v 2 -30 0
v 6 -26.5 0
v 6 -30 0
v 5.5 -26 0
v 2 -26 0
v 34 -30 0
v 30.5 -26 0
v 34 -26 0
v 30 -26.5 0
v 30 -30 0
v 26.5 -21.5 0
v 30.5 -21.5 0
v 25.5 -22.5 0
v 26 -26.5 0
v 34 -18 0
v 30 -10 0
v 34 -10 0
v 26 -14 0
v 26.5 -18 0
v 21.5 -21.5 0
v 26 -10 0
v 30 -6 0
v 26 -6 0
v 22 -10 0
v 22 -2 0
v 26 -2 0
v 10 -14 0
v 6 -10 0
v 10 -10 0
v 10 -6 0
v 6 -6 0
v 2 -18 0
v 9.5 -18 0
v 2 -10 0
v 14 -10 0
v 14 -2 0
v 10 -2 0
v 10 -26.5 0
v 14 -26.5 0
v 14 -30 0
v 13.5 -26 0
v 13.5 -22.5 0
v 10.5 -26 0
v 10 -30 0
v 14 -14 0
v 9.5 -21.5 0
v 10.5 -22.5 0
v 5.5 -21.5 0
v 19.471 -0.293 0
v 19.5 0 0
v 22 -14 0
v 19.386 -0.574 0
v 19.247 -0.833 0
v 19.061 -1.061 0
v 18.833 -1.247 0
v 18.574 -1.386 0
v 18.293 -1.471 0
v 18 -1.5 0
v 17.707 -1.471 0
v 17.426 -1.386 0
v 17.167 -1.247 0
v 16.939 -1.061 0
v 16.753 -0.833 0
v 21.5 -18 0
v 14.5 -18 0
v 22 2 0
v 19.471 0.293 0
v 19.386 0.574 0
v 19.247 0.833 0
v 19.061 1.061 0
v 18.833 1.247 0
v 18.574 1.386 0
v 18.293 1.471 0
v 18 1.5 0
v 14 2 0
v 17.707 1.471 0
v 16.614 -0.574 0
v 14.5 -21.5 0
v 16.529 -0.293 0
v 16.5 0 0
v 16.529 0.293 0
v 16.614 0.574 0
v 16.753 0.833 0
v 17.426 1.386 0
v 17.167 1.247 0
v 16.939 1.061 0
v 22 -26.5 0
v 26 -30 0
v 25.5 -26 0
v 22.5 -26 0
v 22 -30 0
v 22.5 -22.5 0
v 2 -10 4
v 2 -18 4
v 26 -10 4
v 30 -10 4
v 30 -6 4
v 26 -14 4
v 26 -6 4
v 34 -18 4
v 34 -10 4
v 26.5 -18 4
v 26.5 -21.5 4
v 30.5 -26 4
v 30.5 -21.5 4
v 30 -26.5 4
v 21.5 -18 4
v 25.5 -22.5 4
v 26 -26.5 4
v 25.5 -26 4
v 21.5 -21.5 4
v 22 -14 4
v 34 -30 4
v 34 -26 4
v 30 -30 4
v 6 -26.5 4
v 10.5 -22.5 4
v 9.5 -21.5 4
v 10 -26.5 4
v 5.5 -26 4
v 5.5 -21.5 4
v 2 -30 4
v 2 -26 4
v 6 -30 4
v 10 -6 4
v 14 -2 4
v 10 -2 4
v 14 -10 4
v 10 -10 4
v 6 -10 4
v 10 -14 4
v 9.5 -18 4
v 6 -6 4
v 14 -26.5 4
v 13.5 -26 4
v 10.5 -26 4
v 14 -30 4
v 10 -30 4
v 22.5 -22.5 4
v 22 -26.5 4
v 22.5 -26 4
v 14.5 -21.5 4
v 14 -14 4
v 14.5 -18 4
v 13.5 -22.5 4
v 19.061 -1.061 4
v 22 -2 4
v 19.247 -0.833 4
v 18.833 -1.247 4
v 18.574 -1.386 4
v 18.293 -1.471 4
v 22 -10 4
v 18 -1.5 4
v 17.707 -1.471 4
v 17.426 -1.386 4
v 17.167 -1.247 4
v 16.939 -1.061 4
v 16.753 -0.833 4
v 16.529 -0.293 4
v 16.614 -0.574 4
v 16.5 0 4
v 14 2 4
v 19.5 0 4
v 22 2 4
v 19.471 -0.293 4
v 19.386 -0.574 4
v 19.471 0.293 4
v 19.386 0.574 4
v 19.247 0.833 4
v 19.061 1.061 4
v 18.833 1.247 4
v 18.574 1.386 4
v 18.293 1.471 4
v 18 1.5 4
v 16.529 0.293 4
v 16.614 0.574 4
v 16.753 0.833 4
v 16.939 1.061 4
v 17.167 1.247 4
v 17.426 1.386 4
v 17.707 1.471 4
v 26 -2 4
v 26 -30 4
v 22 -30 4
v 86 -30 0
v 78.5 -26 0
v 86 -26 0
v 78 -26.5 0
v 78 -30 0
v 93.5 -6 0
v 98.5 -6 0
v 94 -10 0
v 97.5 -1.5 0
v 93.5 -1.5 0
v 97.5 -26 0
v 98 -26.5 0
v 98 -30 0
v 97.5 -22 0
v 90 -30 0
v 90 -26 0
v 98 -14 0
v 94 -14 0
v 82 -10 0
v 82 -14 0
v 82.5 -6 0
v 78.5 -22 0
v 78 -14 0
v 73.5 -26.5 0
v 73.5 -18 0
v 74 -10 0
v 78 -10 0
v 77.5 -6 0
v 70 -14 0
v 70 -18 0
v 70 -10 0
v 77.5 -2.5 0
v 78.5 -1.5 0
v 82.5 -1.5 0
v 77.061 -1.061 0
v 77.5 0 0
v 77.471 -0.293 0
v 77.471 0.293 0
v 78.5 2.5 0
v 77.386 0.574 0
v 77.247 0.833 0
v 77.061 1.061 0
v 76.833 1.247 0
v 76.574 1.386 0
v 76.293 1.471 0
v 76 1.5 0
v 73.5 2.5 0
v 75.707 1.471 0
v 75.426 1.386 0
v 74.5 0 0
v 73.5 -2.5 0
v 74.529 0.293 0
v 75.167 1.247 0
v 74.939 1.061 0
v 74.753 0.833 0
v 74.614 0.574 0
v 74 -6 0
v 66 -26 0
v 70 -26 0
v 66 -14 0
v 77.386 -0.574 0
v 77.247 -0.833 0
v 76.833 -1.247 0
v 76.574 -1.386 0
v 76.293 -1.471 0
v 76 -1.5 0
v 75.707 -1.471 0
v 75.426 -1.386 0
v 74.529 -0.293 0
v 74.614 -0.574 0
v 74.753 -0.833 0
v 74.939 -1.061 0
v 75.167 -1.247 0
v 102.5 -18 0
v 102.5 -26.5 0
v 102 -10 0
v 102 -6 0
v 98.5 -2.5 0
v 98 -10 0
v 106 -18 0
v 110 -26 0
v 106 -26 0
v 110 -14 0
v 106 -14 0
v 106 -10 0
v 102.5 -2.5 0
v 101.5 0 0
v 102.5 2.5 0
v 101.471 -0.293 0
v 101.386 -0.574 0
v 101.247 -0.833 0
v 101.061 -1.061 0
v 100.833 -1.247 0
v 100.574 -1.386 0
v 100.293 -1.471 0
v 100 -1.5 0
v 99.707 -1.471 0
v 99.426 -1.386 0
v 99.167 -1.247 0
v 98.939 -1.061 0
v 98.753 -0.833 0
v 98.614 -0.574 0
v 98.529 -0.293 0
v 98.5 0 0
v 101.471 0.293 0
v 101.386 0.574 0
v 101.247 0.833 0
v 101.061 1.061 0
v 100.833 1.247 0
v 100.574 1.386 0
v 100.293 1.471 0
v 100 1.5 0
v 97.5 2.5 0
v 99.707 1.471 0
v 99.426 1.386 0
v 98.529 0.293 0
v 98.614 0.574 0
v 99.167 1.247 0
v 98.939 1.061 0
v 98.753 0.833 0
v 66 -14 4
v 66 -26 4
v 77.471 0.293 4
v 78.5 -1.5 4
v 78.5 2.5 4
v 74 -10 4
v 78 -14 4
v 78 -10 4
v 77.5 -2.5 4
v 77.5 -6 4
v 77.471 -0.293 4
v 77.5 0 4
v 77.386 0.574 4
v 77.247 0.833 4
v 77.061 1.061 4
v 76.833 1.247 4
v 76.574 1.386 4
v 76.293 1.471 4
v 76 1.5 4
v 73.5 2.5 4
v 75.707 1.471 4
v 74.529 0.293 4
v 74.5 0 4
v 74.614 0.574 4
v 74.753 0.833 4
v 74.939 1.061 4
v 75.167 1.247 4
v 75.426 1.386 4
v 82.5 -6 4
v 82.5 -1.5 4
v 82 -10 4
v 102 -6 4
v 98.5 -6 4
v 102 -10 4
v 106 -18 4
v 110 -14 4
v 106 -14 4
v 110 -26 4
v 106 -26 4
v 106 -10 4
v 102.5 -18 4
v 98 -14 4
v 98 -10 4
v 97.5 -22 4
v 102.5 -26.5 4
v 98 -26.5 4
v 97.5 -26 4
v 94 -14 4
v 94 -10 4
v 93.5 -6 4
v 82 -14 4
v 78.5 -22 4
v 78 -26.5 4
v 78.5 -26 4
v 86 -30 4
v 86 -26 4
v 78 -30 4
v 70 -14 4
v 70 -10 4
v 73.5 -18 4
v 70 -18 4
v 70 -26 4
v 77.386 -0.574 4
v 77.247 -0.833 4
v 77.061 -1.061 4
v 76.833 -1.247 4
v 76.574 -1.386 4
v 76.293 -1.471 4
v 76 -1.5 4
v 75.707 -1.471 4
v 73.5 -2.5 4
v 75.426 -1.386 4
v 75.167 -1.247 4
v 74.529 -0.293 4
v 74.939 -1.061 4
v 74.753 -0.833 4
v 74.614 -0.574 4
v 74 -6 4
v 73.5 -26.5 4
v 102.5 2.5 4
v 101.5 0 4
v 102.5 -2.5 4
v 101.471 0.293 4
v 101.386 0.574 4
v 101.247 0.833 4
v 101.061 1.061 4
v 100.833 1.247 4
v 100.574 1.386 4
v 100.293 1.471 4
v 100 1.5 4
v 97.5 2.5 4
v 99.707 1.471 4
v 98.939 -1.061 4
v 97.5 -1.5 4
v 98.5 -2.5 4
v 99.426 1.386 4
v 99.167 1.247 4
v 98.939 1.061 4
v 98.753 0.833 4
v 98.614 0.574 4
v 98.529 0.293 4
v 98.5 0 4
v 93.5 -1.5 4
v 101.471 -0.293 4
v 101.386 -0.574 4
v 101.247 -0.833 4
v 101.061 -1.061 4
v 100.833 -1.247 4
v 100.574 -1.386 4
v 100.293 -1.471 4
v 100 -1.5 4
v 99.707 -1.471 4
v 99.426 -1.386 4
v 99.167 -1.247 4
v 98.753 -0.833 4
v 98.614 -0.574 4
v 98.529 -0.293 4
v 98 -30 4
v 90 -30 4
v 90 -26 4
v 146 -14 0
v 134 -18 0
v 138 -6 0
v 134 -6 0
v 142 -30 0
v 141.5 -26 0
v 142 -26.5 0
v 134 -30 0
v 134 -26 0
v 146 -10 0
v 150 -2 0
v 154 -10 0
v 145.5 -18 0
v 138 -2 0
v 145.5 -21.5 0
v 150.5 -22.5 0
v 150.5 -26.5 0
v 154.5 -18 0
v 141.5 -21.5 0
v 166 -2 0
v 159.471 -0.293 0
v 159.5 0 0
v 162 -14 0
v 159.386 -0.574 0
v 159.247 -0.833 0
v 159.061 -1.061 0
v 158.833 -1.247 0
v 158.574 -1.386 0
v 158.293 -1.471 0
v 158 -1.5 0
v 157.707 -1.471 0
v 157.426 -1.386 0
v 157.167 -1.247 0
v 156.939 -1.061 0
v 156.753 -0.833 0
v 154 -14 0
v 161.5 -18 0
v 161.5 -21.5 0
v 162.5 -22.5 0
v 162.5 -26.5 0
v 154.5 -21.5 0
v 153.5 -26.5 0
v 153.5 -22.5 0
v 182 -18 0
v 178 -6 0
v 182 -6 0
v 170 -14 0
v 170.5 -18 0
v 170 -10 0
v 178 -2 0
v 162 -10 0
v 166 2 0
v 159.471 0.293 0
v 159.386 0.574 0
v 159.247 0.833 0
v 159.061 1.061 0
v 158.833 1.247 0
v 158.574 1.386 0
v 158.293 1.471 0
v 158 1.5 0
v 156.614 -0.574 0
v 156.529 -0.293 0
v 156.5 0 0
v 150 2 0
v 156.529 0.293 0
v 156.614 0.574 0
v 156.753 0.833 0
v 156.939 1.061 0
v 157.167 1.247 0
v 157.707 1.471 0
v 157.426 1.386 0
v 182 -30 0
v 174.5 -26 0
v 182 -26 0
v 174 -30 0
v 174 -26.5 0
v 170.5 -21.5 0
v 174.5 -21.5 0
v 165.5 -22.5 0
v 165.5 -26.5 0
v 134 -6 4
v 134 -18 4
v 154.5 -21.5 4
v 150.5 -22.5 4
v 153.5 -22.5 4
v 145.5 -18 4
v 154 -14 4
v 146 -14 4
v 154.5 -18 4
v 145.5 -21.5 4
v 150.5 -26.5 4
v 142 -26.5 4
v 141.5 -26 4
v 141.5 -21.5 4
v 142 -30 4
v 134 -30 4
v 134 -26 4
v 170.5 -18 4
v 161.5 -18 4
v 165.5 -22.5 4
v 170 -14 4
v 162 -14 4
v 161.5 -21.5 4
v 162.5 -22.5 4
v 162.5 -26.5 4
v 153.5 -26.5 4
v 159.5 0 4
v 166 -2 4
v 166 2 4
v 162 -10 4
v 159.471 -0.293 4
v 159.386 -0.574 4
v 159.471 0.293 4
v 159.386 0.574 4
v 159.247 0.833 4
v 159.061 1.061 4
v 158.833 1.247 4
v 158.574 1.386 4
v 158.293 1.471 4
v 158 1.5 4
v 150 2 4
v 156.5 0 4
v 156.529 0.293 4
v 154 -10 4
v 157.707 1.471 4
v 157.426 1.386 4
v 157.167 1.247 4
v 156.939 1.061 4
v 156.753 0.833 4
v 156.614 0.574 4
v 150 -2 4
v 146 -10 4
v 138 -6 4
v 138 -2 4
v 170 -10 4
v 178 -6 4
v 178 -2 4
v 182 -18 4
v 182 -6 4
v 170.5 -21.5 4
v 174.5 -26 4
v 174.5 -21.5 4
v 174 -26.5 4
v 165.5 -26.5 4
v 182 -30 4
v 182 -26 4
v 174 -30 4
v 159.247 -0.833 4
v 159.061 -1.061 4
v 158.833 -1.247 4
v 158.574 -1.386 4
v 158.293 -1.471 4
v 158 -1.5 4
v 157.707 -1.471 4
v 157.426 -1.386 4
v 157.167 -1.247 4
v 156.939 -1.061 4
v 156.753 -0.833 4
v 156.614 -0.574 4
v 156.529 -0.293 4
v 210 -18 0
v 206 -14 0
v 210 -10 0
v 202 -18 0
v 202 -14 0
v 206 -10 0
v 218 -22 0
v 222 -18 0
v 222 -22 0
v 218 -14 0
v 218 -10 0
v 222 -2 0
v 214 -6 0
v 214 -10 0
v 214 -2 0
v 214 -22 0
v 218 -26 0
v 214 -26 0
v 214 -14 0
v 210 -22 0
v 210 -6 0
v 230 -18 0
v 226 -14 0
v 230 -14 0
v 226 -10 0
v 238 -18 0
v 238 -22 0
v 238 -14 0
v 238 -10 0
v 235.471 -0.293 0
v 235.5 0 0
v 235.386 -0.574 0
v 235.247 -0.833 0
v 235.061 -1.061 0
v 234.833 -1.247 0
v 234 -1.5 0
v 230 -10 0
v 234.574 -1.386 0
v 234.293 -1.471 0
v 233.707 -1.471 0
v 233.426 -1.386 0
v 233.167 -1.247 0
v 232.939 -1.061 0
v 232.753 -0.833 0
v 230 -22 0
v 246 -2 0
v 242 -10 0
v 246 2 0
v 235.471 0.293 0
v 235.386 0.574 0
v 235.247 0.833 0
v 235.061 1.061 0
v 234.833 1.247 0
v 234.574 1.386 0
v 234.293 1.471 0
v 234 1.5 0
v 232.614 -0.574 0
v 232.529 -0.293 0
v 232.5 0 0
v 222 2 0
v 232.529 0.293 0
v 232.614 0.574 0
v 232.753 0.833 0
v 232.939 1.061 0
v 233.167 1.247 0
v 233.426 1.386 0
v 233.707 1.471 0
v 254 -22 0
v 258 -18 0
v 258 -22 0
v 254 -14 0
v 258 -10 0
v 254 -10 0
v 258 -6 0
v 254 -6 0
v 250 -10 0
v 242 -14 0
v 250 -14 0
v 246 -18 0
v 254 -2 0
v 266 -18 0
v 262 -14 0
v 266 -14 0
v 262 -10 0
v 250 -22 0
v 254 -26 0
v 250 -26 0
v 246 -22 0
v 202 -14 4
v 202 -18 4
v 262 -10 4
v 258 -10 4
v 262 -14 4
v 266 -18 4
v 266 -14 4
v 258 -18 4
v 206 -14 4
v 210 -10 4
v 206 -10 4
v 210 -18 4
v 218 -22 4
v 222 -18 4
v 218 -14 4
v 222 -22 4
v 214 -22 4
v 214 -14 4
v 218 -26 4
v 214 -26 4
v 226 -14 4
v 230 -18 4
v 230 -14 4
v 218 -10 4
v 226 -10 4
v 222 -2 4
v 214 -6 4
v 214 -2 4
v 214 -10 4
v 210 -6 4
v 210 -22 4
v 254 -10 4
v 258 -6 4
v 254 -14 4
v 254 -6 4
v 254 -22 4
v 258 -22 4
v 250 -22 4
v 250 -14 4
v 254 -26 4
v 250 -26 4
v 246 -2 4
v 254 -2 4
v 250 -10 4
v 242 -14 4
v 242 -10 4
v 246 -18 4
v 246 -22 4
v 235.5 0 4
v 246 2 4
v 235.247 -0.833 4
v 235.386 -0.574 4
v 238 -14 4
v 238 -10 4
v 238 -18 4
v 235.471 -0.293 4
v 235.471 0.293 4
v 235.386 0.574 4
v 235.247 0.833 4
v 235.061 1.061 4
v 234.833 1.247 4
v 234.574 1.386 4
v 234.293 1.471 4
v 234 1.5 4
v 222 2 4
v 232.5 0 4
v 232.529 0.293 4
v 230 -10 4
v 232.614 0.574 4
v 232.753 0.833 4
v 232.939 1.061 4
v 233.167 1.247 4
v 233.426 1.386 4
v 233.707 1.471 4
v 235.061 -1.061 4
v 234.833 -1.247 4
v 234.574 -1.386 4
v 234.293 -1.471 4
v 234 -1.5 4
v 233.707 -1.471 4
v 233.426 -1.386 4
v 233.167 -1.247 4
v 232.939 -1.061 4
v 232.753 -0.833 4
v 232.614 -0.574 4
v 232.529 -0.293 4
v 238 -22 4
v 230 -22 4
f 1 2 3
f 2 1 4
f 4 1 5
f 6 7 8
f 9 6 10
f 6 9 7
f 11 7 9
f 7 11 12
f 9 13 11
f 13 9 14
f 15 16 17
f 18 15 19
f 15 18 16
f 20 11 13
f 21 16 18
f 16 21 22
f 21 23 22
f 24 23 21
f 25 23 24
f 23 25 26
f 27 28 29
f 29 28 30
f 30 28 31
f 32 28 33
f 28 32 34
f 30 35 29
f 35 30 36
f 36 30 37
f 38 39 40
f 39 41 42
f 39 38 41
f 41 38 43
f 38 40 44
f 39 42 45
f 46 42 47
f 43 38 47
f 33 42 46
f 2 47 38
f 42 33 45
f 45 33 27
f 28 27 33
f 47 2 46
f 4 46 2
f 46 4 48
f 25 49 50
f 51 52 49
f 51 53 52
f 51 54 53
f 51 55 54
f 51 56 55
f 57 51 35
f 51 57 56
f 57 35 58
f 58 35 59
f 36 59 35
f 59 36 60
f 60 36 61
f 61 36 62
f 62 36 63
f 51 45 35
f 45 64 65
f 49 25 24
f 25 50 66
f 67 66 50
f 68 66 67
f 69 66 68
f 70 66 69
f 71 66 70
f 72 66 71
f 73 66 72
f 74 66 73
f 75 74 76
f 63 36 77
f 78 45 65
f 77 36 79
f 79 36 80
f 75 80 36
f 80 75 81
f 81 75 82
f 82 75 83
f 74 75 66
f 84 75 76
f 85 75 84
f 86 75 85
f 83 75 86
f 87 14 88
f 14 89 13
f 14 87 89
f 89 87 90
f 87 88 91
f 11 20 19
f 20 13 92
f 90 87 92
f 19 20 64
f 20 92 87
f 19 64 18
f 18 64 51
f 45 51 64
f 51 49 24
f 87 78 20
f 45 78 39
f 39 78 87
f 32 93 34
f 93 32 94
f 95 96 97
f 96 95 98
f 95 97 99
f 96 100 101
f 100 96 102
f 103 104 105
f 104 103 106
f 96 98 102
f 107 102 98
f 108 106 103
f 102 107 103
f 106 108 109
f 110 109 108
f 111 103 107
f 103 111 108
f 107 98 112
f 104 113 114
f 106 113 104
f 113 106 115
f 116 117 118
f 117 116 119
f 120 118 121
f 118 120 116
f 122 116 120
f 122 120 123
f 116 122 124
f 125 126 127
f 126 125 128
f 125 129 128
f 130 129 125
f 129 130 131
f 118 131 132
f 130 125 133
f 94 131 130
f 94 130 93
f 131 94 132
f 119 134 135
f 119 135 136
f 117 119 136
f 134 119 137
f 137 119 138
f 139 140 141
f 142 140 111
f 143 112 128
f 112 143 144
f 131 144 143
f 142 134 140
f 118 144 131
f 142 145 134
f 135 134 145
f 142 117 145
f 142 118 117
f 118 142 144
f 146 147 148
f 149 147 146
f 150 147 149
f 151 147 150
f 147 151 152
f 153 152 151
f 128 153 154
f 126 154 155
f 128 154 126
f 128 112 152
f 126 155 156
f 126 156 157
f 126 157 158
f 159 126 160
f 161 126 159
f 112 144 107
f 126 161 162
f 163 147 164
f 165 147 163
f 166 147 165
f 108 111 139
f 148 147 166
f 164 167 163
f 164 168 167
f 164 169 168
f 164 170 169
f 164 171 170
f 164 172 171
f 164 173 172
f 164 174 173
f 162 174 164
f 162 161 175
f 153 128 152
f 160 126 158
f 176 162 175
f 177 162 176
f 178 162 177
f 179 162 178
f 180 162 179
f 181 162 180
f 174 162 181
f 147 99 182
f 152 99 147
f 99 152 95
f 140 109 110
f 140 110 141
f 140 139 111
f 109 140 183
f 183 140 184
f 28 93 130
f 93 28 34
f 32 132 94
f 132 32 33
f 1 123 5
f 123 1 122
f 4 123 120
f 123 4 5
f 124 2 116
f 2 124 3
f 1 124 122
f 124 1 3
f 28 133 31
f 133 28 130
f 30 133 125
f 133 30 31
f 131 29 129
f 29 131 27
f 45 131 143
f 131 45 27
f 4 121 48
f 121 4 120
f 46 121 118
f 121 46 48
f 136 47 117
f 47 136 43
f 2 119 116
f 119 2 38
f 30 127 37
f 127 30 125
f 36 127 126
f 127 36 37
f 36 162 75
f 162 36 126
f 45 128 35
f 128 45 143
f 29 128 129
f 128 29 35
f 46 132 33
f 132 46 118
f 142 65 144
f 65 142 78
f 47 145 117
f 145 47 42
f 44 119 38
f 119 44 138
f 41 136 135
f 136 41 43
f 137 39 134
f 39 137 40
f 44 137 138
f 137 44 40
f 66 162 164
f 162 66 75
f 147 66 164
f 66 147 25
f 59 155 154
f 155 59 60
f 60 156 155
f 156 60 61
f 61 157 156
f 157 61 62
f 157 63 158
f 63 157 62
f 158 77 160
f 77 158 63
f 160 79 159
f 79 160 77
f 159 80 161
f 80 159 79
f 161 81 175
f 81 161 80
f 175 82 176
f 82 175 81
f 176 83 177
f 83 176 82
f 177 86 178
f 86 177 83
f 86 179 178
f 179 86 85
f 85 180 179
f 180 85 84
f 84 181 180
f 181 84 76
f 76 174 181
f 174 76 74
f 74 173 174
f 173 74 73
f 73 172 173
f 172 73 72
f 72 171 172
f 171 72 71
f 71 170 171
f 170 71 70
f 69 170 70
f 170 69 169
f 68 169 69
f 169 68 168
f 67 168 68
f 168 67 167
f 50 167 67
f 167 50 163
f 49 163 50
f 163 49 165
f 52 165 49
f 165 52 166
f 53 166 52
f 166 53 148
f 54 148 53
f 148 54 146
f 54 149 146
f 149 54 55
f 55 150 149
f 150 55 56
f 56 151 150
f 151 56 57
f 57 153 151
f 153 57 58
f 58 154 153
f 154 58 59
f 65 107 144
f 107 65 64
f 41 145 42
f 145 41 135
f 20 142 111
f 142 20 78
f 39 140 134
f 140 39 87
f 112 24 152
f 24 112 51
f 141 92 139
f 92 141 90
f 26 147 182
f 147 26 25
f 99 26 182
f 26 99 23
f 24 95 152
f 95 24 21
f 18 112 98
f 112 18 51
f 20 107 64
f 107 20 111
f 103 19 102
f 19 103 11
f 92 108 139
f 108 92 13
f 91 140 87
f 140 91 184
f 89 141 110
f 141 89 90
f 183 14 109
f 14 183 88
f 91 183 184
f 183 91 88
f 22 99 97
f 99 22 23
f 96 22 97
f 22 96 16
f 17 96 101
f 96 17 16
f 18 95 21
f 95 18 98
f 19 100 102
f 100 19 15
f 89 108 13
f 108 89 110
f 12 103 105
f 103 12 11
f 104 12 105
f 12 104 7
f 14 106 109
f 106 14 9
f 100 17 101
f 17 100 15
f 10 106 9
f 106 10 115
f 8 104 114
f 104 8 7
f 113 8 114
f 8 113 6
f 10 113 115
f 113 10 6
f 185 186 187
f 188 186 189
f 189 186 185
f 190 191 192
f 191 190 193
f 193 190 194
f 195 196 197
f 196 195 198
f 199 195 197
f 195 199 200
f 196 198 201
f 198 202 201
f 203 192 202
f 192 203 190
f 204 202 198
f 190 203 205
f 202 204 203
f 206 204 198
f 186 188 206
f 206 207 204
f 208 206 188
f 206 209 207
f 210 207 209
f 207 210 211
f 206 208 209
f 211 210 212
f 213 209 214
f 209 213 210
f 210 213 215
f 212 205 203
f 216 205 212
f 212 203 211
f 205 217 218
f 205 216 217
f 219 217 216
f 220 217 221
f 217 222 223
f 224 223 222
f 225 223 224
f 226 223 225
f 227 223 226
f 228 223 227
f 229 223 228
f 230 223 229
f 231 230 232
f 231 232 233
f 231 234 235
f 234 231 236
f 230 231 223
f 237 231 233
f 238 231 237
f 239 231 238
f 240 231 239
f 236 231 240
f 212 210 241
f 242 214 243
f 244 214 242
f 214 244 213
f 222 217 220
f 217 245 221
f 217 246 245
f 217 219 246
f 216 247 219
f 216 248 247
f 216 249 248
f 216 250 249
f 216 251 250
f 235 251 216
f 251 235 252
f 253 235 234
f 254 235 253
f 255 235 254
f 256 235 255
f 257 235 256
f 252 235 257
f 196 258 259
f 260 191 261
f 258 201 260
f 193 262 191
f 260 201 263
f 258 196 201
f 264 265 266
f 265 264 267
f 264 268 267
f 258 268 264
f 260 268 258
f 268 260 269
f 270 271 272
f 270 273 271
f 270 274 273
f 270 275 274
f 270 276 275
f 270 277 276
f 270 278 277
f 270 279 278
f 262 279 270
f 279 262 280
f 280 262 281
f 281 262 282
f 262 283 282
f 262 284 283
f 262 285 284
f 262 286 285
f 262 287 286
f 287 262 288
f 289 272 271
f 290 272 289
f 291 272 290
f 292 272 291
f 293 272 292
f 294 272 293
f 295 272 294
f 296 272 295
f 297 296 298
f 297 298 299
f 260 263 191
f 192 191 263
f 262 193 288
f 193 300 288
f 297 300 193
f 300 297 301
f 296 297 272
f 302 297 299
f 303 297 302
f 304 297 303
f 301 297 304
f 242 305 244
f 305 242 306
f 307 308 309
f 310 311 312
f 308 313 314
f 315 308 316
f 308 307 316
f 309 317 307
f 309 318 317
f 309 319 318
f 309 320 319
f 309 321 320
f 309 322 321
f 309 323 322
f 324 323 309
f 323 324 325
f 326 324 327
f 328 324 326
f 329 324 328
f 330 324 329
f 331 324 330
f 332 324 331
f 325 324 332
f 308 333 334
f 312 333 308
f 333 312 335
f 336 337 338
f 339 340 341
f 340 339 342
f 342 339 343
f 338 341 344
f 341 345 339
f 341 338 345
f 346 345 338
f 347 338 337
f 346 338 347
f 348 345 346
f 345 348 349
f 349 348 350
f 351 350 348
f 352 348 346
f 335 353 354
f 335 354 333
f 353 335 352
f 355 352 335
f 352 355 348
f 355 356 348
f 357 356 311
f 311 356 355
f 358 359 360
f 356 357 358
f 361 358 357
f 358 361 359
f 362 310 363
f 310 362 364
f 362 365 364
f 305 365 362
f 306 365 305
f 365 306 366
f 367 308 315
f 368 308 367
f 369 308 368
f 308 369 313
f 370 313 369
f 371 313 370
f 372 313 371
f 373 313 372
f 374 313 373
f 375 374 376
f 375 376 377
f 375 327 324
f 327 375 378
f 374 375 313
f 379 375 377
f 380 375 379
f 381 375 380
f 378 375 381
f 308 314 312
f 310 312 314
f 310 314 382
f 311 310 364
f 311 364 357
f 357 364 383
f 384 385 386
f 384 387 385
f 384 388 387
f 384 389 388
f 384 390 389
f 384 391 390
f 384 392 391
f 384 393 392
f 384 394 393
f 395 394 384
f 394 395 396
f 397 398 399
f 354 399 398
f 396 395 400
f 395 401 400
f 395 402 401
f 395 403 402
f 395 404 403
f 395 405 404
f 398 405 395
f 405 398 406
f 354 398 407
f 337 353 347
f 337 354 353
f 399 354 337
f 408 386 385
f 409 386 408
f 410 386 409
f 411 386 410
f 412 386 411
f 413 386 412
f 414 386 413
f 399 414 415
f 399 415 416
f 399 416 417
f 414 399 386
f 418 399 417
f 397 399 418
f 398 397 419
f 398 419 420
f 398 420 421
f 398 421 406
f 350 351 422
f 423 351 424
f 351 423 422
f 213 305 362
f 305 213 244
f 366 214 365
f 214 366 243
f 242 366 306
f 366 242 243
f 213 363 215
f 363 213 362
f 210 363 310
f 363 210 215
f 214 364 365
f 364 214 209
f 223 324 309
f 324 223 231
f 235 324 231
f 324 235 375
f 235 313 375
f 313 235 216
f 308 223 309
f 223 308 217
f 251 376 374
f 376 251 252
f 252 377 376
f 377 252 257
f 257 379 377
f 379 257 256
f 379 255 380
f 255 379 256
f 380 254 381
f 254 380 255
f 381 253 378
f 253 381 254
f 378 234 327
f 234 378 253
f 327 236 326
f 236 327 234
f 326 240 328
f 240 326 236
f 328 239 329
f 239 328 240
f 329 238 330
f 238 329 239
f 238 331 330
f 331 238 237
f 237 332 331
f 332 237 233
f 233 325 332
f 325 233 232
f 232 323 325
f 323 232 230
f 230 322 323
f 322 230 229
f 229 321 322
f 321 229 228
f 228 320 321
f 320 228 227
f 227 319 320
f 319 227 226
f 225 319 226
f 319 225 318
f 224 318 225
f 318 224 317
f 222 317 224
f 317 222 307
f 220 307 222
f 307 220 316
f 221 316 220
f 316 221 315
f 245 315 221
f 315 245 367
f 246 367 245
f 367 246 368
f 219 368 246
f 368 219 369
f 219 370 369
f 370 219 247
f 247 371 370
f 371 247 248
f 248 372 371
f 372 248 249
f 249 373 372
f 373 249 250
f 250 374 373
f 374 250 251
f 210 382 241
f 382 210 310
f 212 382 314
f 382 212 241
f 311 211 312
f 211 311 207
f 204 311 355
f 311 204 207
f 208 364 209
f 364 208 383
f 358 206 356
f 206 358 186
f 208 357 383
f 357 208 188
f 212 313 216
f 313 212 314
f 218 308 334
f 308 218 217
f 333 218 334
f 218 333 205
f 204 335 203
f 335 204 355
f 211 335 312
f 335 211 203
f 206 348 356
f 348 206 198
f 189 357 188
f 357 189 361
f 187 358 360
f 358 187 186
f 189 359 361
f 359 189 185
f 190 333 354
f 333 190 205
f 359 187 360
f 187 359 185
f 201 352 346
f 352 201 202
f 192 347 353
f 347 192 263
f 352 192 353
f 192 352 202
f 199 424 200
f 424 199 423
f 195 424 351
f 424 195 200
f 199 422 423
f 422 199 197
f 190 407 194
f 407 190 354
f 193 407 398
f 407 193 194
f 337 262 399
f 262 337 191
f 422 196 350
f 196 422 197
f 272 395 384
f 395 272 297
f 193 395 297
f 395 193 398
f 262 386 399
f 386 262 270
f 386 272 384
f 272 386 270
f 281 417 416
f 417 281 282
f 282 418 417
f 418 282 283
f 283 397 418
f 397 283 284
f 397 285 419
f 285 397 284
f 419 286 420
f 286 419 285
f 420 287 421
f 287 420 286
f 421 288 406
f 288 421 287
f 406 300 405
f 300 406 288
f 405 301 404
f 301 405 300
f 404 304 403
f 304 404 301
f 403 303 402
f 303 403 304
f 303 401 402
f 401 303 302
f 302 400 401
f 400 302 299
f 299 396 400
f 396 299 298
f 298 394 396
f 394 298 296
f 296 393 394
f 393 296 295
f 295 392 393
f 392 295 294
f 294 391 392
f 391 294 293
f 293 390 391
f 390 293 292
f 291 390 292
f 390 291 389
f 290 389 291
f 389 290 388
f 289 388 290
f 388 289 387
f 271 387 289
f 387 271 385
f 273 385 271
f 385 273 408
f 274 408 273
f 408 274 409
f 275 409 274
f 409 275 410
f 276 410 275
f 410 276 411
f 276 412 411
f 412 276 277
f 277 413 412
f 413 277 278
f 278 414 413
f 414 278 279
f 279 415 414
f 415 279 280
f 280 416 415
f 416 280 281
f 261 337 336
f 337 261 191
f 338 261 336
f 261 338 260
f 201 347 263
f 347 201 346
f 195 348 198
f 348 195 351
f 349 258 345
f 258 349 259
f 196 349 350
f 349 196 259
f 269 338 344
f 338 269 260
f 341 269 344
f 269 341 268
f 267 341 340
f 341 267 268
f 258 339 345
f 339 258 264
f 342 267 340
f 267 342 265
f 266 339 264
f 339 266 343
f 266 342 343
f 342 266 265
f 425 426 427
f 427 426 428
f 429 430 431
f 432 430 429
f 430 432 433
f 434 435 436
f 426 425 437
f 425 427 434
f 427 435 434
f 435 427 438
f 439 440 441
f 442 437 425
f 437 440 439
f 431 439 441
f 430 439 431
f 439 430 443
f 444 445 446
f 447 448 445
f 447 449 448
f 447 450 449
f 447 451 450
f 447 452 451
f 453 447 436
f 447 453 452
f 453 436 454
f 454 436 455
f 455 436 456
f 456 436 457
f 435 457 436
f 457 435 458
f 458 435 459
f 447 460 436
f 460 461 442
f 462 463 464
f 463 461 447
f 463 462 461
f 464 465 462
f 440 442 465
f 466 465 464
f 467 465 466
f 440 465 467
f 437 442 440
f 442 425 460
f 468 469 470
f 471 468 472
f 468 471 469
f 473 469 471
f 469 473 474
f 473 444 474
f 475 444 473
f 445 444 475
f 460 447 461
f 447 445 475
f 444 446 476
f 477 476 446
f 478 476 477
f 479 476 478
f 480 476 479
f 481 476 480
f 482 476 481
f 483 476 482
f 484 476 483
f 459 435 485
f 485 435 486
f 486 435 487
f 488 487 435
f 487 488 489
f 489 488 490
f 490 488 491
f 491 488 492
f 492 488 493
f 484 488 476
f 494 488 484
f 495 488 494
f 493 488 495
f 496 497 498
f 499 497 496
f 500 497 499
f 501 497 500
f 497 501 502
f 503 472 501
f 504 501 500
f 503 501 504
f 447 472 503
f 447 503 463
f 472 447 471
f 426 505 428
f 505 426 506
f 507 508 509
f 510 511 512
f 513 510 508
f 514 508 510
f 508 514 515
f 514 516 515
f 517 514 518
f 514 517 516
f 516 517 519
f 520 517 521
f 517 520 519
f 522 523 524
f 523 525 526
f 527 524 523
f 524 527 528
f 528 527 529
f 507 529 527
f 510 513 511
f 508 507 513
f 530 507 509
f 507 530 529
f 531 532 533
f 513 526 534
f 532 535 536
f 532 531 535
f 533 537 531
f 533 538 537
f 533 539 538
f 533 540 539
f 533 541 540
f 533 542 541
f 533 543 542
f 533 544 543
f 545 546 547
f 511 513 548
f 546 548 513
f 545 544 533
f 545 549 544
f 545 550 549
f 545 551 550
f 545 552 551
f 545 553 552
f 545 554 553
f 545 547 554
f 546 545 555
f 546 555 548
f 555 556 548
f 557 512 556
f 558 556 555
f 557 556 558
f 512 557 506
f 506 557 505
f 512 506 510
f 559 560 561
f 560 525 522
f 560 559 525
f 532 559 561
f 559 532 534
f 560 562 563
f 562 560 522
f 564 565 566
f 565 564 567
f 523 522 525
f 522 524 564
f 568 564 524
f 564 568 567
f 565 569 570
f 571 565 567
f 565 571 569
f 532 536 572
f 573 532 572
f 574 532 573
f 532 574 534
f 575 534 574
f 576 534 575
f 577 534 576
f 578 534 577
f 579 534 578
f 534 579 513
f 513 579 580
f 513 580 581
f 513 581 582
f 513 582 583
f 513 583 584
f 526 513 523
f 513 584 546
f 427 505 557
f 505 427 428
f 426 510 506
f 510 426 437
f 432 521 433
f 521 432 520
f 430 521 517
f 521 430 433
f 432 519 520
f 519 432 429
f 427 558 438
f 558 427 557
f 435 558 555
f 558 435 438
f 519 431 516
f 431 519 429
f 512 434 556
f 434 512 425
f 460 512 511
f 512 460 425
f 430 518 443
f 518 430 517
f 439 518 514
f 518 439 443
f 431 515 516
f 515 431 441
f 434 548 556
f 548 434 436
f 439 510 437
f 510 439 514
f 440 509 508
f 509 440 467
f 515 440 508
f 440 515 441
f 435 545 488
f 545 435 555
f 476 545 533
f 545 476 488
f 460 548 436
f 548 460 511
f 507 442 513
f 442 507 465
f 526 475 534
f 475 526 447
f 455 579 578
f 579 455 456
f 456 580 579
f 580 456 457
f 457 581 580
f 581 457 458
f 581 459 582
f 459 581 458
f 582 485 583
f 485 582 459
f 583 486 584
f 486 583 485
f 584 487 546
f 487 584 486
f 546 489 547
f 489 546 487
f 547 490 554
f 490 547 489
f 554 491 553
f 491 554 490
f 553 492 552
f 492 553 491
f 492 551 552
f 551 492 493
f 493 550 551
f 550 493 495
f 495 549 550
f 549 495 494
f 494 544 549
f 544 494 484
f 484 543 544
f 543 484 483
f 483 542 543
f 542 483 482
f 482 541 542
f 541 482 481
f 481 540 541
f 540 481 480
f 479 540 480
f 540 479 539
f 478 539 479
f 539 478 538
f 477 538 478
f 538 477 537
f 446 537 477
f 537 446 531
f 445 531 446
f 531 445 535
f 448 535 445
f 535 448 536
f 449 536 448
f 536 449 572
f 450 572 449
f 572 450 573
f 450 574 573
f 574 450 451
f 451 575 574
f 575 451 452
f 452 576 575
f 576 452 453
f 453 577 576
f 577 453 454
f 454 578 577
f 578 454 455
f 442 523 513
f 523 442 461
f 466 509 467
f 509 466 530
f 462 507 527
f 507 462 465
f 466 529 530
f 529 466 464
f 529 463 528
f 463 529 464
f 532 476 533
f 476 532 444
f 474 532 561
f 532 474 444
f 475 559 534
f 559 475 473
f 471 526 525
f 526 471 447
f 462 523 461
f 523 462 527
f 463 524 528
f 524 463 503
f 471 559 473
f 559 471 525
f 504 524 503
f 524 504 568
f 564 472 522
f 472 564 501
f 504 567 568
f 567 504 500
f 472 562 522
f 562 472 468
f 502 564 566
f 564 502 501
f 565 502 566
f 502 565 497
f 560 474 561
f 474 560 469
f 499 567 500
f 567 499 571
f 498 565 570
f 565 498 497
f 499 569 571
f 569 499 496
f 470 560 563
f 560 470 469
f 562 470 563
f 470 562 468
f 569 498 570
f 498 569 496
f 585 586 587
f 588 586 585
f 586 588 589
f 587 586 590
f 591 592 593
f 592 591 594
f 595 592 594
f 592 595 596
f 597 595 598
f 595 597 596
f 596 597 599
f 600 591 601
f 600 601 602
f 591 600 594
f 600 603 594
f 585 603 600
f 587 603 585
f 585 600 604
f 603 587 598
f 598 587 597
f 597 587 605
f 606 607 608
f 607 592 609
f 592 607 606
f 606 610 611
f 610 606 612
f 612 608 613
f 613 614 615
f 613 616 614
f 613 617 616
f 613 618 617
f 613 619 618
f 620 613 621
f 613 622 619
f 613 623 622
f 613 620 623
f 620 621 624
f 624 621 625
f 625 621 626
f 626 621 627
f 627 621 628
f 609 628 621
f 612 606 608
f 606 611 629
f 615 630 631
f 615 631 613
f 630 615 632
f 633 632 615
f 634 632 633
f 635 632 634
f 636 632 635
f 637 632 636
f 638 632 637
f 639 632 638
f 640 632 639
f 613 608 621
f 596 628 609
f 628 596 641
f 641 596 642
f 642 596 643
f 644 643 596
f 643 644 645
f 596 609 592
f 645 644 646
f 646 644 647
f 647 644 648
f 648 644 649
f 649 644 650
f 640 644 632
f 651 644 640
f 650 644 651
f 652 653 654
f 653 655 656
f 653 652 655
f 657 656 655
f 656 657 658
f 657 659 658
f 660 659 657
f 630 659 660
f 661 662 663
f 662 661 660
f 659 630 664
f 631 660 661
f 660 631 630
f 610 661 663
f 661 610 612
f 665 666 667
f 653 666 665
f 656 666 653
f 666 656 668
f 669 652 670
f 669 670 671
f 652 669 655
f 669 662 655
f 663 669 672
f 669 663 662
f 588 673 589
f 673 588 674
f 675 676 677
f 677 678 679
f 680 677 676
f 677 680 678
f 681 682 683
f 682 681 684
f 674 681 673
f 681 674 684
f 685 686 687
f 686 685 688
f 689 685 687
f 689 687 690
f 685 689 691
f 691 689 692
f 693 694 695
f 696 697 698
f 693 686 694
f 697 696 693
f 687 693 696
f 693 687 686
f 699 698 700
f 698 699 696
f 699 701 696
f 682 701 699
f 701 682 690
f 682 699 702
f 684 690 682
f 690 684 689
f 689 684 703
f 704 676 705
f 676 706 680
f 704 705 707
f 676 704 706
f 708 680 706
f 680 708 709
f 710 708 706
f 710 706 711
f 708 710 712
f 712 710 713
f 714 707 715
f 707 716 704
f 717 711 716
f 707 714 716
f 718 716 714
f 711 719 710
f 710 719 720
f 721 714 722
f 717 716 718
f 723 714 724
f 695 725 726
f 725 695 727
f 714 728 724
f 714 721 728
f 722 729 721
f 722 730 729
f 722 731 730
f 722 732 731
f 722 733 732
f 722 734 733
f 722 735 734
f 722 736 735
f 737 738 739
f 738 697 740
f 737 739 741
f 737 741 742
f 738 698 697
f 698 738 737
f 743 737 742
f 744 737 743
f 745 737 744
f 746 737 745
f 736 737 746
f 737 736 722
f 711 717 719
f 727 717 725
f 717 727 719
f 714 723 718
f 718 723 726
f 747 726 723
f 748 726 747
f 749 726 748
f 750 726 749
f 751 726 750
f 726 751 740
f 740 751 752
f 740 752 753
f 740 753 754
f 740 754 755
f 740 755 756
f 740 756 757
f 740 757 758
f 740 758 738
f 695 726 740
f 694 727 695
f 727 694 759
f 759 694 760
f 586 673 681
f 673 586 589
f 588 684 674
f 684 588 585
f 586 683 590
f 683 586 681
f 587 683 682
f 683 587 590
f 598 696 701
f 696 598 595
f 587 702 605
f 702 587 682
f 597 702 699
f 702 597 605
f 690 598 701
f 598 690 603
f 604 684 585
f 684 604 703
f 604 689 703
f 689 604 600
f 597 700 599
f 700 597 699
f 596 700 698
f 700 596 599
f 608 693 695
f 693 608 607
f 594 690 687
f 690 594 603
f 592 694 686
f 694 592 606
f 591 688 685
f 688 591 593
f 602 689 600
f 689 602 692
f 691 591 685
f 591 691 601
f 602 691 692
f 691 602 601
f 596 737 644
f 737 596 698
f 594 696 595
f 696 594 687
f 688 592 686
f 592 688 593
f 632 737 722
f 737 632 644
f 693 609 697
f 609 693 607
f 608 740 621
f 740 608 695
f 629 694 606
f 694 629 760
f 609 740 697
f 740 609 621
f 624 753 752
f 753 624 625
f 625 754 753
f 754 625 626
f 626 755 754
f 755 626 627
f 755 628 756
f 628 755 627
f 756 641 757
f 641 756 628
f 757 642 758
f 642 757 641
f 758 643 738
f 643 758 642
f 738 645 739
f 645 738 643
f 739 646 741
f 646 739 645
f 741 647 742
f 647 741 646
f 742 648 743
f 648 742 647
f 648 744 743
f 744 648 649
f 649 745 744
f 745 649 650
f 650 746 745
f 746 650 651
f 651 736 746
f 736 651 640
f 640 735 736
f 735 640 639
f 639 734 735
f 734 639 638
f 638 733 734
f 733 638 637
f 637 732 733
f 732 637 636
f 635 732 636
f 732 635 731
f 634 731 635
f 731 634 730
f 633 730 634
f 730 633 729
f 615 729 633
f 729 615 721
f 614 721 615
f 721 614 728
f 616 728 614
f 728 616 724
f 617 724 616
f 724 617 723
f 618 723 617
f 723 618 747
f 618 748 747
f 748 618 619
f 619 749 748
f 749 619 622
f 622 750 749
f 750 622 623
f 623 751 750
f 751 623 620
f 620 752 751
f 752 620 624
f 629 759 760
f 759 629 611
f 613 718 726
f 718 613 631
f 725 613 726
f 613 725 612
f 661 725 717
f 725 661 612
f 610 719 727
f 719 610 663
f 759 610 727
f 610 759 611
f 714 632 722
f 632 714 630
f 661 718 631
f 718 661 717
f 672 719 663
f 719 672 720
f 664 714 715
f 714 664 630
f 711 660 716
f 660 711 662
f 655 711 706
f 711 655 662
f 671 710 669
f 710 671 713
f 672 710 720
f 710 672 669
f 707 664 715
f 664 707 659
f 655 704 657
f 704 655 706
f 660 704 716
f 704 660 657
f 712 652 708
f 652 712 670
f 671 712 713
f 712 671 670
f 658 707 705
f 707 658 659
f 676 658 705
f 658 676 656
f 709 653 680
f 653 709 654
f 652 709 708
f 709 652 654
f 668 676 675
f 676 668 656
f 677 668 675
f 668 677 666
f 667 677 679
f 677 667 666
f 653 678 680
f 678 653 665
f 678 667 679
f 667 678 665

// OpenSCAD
// Parametric 8bit Space Invader Ornaments
// https://www.thingiverse.com/thing:3283969
// by Bikecyclist
// https://www.thingiverse.com/Bikecyclist
// 
// Remix of
// Parametric 8bit Space Invader Ornaments
// https://www.thingiverse.com/thing:5080
// by 4volt
// https://www.thingiverse.com/4volt

// Size of "Pixel" in x Direction
x_scale = 4;

// Size of "Pixel" in y Direction
y_scale = 4;

// Thickness of Invader (in z Direction)
z_scale = 4;

// Diameter of Hole for Suspending the Invader (0 = no hole)
d_hole = 3;

// Extra size of "oversized" Pixel to ensure overlap with otherwise floating pixels
overlap = 1;

// Number of Facets
$fn = 32;

// Derived Parameters
X_scale = x_scale + overlap;
Y_scale = y_scale + overlap;

/* [Hidden] */

// Maximum Pixel Count in X Direction (one less than actual Pixels)
x_max = 15;

// Maximum Pixel Count in y Direction (one less than actual Pixels)
y_max = 7;

// Maximum Invader Count (one less than actual Invaders)
inv_max = 3;


// Invaders Definition
//
// invader [0]: without holes
// invader [1]: with holes
// invader [*][0:inv_max]: invader variant
// invader [*][*][0:ymax]: invader variant horizontal line
//
// Symbols used:
// SPACE - empty Pixel
// x - normal solid Pixel
// X - oversized solid Pixel to ensure overlap with "floating" pixels
// o - normal solid pixel with round hole
// q - two horizontally adjacent normal solid pixels with round hole ... works only if the next pixel to the right is defined as empty, though it will be rendered as solid


invader =
    [
        [
            [
                "    xx    ",
                "   xxxx   ",
                "  xxxxxx  ",
                " xx xx xx ",
                " xxxxxxxx ",
                "   X  X   ",
                "  X XX X  ",
                " x x  x x ",
            ],
            [
                "  X     X  ",
                "   X   X   ",
                "  xxxxxxx  ",
                " xx xxx xx ",
                "xxxxxxxxxxx",
                "x XxxxxxX x",
                "x X     X x",
                "   xx xx   ",
            ],
            [
                "    xxxx    ",
                " xxxxxxxxxx ",
                "xxxxxxxxxxxx",
                "xxx  xx  xxx",
                "xxxxxxxxxxxx",
                "   XX  XX   ",
                "  XX XX XX  ",
                "xx        xx",
            ],
            [
                "     xxxxxx     ",
                "   xxxxxxxxxx   ",
                "  xxxxxxxxxxxx  ",
                " xx xx xx xx xx ",
                "xxxxxxxxxxxxxxxx",
                "  xxx  xx  xxx  ",
                "   x        x   "
            ],
        ],
        [
            [
                "    q     ",
                "   xxxx   ",
                "  xxxxxx  ",
                " xx xx xx ",
                " xxxxxxxx ",
                "   X  X   ",
                "  X XX X  ",
                " x x  x x ",
            ],
            [
                "  O     O  ",
                "   X   X   ",
                "  xxxxxxx  ",
                " xx xxx xx ",
                "xxxxxxxxxxx",
                "x XxxxxxX x",
                "x X     X x",
                "   xx xx   ",
            ],
            [
                "    xq x    ",
                " xxxxxxxxxx ",
                "xxxxxxxxxxxx",
                "xxx  xx  xxx",
                "xxxxxxxxxxxx",
                "   XX  XX   ",
                "  XX XX XX  ",
                "xx        xx",
            ],
            [
                "     xxq xx     ",
                "   xxxxxxxxxx   ",
                "  xxxxxxxxxxxx  ",
                " xx xx xx xx xx ",
                "xxxxxxxxxxxxxxxx",
                "  xxx  xx  xxx  ",
                "   x        x   "
            ]
        ]
    ];


for (i = [0:inv_max])
    translate ([i * x_scale * (x_max + 2), 0, 0])
    invader (i, d_hole==0?0:1);

module invader (i, j)
{
    for (x = [0:x_max], y = [0:y_max])
        translate ([x * x_scale, -y * y_scale, 0])
            linear_extrude (z_scale)
                invader_tile (invader [j][i][y][x]);
}

module invader_tile (tile)
{
    if (tile == "x")
        square ([x_scale, y_scale], center = true);
    else if (tile == "X")
        square ([X_scale, Y_scale], center = true);
    else if (tile == "o")
        difference ()
        {
            square ([x_scale, y_scale], center = true);
            
            circle (d = d_hole);
        }
    else if (tile == "O")
        difference ()
        {
            square ([X_scale, Y_scale], center = true);
            
            circle (d = d_hole);
        }
    else if (tile == "q")
        translate ([x_scale/2, 0])
        difference ()
        {
            square ([2 * x_scale, y_scale], center = true);
            
            circle (d = d_hole);
        }
}
